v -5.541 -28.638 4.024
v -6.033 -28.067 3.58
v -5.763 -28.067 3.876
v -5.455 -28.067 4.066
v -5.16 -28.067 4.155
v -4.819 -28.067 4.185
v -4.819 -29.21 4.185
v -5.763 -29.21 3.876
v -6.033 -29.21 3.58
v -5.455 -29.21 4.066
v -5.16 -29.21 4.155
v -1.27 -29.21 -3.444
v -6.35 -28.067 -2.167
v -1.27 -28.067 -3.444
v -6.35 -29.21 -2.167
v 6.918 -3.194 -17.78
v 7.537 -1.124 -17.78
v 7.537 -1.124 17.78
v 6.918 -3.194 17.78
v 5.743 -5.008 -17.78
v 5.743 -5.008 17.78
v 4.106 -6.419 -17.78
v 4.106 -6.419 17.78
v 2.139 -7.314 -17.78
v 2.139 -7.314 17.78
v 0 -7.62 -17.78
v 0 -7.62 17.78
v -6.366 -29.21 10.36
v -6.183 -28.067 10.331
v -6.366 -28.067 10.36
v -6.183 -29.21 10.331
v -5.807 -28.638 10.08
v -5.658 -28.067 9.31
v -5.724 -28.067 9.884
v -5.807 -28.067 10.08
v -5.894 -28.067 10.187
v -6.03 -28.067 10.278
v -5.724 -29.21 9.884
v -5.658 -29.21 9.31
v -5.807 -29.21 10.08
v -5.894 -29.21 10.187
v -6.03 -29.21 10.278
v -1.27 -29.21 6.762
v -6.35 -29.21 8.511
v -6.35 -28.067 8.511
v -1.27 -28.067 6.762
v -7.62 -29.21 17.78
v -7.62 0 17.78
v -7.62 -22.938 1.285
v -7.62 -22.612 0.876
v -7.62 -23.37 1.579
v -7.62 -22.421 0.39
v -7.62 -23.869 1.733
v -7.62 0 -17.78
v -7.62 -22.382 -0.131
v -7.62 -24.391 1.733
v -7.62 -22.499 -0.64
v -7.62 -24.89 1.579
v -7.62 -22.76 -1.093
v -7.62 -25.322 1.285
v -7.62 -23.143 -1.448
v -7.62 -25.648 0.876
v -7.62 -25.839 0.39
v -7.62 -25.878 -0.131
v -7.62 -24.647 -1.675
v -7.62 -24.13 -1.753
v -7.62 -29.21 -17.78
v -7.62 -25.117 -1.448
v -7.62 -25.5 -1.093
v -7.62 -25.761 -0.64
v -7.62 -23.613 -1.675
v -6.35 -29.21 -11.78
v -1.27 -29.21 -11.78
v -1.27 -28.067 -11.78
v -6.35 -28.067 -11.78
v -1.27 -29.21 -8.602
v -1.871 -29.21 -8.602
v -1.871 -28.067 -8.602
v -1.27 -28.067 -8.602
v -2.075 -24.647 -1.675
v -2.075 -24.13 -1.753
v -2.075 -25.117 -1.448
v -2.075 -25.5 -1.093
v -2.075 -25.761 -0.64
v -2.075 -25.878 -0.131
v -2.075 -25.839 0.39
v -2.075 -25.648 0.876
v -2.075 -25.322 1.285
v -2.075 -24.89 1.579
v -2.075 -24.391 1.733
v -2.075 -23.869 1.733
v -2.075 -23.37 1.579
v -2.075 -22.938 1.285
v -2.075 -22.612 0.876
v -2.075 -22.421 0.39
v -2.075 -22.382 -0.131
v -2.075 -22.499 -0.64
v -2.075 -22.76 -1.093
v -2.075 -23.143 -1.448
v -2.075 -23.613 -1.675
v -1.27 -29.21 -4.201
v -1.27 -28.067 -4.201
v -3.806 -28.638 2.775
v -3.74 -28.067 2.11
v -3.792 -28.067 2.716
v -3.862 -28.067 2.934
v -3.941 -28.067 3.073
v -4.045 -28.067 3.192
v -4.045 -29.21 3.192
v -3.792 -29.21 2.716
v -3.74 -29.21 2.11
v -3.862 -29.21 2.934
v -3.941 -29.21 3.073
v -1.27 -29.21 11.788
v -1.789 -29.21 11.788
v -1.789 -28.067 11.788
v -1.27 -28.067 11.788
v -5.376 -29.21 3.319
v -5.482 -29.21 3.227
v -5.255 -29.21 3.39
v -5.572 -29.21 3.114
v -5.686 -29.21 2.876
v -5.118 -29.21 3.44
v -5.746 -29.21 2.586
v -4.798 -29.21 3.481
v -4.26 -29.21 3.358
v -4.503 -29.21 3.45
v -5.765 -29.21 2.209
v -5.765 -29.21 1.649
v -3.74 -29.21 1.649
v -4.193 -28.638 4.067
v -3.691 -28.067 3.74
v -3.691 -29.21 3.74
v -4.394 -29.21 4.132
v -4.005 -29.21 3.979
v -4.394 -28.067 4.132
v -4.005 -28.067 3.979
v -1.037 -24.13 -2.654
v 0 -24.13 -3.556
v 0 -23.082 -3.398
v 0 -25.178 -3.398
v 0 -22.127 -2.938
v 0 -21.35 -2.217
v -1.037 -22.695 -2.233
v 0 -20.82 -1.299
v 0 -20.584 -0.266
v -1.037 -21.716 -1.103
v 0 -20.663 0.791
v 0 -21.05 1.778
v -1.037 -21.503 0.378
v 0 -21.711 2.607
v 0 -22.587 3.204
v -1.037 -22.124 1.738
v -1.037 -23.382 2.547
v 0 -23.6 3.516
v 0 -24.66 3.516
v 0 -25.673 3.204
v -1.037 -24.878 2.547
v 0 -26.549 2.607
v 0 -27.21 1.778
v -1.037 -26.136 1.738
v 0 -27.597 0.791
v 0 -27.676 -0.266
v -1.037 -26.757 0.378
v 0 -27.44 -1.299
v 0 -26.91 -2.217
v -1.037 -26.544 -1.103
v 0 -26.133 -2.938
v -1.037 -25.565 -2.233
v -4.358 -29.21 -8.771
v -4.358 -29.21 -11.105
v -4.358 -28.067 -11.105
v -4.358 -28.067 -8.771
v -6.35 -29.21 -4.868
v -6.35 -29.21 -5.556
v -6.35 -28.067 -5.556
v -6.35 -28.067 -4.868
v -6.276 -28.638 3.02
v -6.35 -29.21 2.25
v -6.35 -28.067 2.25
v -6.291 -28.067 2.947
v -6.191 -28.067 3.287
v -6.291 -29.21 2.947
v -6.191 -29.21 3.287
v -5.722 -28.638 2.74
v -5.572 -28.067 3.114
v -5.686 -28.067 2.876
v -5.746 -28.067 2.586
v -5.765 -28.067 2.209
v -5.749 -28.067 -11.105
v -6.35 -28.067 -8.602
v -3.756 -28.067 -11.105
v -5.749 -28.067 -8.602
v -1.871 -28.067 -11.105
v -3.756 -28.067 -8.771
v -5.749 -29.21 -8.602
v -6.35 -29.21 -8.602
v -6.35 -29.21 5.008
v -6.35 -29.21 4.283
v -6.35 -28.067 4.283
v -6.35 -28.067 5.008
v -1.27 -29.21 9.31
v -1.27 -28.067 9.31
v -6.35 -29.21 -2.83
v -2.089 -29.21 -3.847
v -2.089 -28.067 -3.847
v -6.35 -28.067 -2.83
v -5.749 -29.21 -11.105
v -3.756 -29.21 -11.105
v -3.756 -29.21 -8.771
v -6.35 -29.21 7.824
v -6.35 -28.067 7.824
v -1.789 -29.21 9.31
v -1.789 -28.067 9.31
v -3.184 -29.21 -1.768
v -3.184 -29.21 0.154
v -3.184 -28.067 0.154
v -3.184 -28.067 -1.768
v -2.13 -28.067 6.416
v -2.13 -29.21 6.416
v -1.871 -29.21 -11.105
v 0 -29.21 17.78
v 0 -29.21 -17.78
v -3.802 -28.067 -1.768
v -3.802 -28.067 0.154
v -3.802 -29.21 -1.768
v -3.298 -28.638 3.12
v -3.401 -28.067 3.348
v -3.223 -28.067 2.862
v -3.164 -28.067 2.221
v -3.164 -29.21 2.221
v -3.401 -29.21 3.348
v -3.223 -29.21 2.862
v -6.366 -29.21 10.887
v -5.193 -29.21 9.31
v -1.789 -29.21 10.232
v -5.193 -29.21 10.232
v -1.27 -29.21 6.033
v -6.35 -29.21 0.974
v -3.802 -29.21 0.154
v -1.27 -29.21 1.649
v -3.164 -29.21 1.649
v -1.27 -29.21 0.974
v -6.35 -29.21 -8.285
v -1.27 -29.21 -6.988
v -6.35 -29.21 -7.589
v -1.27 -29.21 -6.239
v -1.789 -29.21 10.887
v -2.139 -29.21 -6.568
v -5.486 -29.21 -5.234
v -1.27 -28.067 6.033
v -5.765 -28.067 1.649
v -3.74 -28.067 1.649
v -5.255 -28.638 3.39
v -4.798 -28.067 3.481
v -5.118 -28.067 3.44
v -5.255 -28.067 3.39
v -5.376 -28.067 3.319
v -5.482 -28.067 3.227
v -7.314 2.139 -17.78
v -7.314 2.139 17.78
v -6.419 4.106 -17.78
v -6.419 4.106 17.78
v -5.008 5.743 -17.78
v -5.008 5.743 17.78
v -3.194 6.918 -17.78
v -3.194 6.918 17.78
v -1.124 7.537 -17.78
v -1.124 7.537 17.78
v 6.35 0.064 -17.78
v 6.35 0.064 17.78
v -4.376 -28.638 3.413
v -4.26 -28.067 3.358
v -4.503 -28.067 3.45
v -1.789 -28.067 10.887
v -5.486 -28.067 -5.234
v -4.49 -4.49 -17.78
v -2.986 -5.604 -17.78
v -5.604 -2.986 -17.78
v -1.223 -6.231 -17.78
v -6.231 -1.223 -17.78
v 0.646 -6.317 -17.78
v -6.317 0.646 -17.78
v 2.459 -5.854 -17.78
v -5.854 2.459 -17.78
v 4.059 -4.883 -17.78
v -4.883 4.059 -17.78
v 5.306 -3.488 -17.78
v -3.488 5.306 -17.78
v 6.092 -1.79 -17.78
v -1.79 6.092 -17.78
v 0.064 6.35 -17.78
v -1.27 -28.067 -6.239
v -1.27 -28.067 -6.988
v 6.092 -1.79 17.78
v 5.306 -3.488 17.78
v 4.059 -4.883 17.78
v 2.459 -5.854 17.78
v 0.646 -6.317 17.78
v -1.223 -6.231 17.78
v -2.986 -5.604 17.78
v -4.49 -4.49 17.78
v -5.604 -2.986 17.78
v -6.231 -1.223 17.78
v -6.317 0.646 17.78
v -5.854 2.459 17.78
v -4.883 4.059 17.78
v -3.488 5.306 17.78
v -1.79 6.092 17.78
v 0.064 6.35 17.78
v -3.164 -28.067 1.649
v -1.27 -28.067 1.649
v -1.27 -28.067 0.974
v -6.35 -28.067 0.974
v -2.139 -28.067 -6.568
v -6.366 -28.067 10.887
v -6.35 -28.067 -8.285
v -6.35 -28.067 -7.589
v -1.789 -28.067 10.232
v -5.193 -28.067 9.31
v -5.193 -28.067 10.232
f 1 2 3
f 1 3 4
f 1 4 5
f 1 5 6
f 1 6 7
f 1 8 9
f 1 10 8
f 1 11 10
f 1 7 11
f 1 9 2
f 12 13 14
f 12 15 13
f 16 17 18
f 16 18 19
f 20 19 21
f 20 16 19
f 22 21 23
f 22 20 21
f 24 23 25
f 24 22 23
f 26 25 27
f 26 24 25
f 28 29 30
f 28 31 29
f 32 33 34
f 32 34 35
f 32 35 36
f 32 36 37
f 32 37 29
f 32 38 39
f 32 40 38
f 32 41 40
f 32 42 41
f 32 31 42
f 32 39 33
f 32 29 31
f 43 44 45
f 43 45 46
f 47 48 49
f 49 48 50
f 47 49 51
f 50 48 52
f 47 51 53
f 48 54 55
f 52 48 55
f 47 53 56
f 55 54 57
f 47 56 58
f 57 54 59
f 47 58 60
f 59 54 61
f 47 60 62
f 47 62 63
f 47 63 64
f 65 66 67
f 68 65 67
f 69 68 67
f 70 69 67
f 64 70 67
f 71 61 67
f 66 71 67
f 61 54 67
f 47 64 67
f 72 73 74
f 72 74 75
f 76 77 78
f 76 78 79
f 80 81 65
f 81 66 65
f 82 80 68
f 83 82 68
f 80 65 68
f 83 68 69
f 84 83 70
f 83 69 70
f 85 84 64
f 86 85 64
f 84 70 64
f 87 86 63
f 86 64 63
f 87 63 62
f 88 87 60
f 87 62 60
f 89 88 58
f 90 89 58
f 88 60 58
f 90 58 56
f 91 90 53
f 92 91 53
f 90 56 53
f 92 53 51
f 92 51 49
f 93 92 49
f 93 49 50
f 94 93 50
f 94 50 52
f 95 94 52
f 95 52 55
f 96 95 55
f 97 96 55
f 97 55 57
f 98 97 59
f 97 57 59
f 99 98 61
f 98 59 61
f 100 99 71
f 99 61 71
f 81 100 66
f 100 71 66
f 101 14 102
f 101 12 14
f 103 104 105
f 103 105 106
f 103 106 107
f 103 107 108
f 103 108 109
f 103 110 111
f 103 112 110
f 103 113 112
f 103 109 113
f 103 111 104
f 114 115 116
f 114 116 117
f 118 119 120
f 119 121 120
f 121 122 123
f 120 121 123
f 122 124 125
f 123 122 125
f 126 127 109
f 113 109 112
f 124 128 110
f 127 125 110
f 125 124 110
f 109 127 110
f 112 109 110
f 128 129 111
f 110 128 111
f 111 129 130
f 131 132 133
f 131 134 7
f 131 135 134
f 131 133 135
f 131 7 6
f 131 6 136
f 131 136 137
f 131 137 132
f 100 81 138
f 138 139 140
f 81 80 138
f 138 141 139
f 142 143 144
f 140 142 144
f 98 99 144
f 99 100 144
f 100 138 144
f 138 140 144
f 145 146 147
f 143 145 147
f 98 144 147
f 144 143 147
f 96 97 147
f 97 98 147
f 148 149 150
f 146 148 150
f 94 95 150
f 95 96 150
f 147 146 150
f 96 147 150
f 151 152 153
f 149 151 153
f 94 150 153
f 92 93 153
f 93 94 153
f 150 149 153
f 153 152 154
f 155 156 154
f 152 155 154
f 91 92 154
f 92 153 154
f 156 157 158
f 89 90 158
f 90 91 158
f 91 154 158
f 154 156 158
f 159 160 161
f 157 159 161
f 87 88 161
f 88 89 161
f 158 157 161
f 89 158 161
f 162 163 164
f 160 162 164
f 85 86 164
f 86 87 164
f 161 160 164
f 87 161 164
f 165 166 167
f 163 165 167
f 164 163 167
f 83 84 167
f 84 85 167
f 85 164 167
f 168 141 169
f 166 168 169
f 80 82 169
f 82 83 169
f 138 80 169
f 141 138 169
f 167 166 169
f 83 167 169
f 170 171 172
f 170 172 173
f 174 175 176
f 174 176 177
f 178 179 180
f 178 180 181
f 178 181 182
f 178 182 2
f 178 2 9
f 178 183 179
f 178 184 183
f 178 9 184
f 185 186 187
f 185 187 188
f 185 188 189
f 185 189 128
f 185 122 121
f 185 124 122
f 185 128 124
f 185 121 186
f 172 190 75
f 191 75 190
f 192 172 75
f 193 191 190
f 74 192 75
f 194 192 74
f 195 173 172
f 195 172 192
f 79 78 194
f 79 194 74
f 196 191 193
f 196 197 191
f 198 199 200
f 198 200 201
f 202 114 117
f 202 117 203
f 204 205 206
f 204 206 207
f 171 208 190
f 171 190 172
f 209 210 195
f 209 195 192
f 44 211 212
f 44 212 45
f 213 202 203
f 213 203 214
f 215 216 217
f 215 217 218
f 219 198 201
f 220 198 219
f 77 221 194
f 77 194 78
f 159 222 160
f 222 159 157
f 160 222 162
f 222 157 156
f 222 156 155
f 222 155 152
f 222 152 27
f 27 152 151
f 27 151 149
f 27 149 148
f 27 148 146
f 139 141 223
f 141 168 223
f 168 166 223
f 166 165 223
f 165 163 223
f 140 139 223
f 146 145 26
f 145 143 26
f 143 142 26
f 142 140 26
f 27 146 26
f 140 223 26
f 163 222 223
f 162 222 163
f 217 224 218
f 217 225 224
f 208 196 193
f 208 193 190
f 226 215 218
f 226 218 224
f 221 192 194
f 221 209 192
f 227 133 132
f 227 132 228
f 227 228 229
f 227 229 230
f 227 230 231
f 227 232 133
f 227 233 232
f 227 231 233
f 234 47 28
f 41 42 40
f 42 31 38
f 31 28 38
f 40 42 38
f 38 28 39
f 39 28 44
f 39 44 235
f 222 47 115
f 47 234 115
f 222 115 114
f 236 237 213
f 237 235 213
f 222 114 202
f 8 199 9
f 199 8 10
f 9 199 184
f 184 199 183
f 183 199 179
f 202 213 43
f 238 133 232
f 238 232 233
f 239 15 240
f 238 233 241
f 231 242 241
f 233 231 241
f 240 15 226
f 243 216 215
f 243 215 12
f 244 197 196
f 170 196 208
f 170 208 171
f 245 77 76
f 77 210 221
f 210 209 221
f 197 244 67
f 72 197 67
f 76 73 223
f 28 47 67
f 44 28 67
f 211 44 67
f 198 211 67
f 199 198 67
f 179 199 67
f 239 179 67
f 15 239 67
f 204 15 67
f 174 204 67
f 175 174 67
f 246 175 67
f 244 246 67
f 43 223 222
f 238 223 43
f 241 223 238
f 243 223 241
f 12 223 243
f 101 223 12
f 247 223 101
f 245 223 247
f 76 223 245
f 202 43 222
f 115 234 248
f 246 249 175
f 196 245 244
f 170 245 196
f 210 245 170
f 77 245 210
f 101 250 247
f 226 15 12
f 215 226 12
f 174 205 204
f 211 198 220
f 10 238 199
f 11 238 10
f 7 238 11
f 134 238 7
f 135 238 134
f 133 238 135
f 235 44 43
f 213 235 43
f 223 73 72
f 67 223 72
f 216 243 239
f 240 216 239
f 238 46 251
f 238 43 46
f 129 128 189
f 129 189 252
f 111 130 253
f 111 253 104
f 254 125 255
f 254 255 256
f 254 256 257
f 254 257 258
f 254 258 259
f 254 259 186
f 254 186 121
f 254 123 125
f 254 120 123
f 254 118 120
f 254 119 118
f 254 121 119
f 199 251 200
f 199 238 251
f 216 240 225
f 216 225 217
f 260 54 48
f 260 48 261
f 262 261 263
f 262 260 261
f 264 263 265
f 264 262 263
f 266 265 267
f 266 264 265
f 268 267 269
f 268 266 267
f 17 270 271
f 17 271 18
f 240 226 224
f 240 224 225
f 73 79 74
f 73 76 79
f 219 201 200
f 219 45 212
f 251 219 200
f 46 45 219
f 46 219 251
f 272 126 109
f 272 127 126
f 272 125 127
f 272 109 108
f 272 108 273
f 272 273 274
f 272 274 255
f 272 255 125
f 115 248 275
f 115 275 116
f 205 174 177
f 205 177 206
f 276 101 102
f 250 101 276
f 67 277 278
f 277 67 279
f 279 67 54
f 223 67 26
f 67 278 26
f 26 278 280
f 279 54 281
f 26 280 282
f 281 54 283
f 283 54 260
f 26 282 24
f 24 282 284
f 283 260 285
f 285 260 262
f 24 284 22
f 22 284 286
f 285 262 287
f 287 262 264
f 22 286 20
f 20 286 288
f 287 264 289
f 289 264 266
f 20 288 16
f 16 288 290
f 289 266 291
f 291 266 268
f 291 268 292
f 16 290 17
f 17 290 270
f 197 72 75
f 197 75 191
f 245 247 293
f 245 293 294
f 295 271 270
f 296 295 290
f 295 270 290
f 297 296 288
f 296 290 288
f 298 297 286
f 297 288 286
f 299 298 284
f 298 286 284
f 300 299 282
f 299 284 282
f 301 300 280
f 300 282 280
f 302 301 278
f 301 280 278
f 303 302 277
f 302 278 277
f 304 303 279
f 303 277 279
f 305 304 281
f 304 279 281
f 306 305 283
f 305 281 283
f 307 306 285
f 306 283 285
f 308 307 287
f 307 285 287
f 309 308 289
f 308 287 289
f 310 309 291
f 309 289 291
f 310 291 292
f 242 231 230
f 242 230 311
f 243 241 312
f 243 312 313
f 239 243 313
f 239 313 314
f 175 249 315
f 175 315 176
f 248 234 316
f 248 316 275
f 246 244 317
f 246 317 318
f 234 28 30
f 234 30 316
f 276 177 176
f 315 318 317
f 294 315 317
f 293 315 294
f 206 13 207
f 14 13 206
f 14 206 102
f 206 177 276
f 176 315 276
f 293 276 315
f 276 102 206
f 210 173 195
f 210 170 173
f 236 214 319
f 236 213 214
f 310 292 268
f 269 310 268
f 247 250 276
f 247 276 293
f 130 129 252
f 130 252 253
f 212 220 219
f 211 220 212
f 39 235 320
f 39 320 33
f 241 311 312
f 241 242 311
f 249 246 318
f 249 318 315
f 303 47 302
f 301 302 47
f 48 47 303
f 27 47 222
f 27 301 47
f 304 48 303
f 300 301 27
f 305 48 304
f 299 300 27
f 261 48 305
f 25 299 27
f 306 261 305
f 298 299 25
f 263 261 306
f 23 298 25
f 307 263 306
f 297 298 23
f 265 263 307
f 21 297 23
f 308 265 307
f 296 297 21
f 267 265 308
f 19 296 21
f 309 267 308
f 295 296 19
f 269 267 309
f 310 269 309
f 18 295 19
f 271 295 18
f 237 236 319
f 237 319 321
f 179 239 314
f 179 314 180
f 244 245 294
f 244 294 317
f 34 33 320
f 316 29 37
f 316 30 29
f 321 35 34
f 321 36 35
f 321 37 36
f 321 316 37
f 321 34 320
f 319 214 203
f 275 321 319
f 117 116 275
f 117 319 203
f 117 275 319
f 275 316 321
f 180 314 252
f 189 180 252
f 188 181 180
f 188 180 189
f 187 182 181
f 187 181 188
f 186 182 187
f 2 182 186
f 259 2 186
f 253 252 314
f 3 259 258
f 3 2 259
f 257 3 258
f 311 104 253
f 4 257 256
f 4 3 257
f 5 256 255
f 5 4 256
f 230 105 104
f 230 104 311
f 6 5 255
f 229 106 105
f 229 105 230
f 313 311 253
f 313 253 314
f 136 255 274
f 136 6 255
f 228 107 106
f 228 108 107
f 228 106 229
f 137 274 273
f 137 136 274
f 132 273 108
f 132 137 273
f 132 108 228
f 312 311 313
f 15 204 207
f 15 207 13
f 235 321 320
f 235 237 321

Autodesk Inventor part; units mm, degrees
ref_plane "YZ Plane" through (0, 0, 0) normal (1, 0, 0) x (0, 1, 0)
ref_plane "XZ Plane" through (0, 0, 0) normal (0, 1, 0) x (-1, 0, 0)
ref_plane "XY Plane" through (0, 0, 0) normal (0, 0, 1) x (1, 0, 0)
sketch "Sketch4" plane through (0, 0, 0) normal (0, 0, 1) x (1, 0, 0)
  arc A0 (0.0635, 6.3497) -> (6.3497, 0.0635) centre (0, 0) ccw
  arc A1 (-1.1235, 7.5367) -> (7.5367, -1.1235) centre (0, 0) ccw
  line L0 (0, 0) -> (0, 7.9375) construction
  line L1 (0.0635, 6.3497) -> (6.3497, 0.0635) construction
  line L2 (0.0635, 6.3497) -> (-1.1235, 7.5367)
  line L3 (6.3497, 0.0635) -> (7.5367, -1.1235)
  circle A2 centre (0, 0) radius 6.35
  dimension "d10" = 12.7
  dimension "d11" = 1.27
  dimension "d12" = 45
  dimension "d13" = 8.89
extrude "Extrusion3" add sketch "Sketch4" along normal mid plane 35.56 contours A0 L3 A1 L2
sketch "Sketch5" plane through (0, 0, 0) normal (0, 0, 1) x (1, 0, 0)
  arc A0 (-1.1235, 7.5367) -> (7.5367, -1.1235) centre (0, 0) ccw projected
  line L0 (-7.62, 0) -> (-7.62, -29.21)
  line L1 (-7.62, -29.21) -> (0, -29.21)
  line L2 (0, -29.21) -> (0, -7.62)
  circle A1 centre (0, 0) radius 7.9375
  dimension "d16" = 21.59
extrude "Extrusion4" add sketch "Sketch5" along normal mid plane 35.56 contours A0 L2 A1 L0 | A1 L2 L1 L0 picked at (-7.3048, -2.4081)
sketch "Sketch6" plane through (0, -29.21, 17.78) normal (1, 0, 0) x (0, 0, -1)
  line L0 (0, 21.59) -> (35.56, 21.59) projected
  line L1 (35.56, 21.59) -> (35.56, 0) projected
  line L2 (0, 0) -> (35.56, 0) projected
  line L3 (0, 0) -> (0, 21.59) projected
  line L4 (17.78, 0) -> (17.78, 21.59) construction
  point P0 (17.78, 29.21)
  point P1 (17.78, 5.08)
  dimension "d30" = 5.08
  dimension "d31" = 0
hole "Hole1" at (0, -24.13, 0) direction (-1, 0, 0) diameter 3.5052 end through all countersink diameter 7.112 countersink angle 82
sketch "Sketch10" plane through (-7.62, -29.21, 17.78) normal (0, -1, 0) x (1, 0, 0)
  line L0 (0, -35.56) -> (0, 0) projected
  line L1 (7.62, -35.56) -> (0, -35.56) projected
  line L2 (7.62, 0) -> (7.62, -35.56) projected
  line L3 (0, 0) -> (7.62, 0) projected
  line L4 (3.81, -35.56) -> (3.81, 0) construction
  line L5 (6.35, -29.5599) -> (1.27, -29.5599)
  line L6 (1.27, -29.5599) -> (1.27, -26.3818)
  line L7 (1.27, -26.3818) -> (1.871, -26.3818)
  line L8 (1.871, -26.3818) -> (1.871, -28.8848)
  line L9 (1.871, -28.8848) -> (3.2625, -28.8848)
  line L10 (3.2625, -28.8848) -> (3.2625, -26.5506)
  line L11 (3.2625, -26.5506) -> (3.8635, -26.5506)
  line L12 (3.8635, -26.5506) -> (3.8635, -28.8848)
  line L13 (3.8635, -28.8848) -> (5.749, -28.8848)
  line L14 (5.749, -28.8848) -> (5.749, -26.3818)
  line L15 (5.749, -26.3818) -> (6.35, -26.3818)
  line L16 (6.35, -26.3818) -> (6.35, -29.5599)
  line L17 (1.27, -19.9474) -> (6.35, -21.2236)
  line L18 (6.35, -21.2236) -> (6.35, -21.9811)
  line L19 (6.35, -21.9811) -> (2.1345, -23.0144)
  line L20 (2.1345, -23.0144) -> (6.35, -24.0188)
  line L21 (6.35, -24.0188) -> (6.35, -24.7681)
  line L22 (6.35, -24.7681) -> (1.27, -26.0648)
  line L23 (1.27, -26.0648) -> (1.27, -25.3691)
  line L24 (1.27, -25.3691) -> (5.4814, -24.3482)
  line L25 (5.4814, -24.3482) -> (1.27, -23.3355)
  line L26 (1.27, -23.3355) -> (1.27, -22.648)
  line L27 (1.27, -22.648) -> (5.5308, -21.6271)
  line L28 (5.5308, -21.6271) -> (1.27, -20.6102)
  line L29 (1.27, -20.6102) -> (1.27, -19.9474)
  line L30 (4.4357, -17.6256) -> (4.4357, -19.5481)
  line L31 (4.4357, -19.5481) -> (3.8182, -19.5481)
  line L32 (3.8182, -19.5481) -> (3.8182, -17.6256)
  line L33 (3.8182, -17.6256) -> (4.4357, -17.6256)
  spline S0 degree 2 poles (2.8014, -13.5954) (3.1307, -13.5954) (3.7235, -13.83) (3.9294, -14.04) knots 0 0 0 1 2 2 2
  spline S1 degree 2 poles (3.9294, -14.04) (4.1887, -14.3035) (4.4563, -15.0156) (4.4563, -15.559) knots 0 0 0 1 2 2 2
  line L34 (4.4563, -15.559) -> (4.4563, -16.1313)
  line L35 (4.4563, -16.1313) -> (6.35, -16.1313)
  line L36 (6.35, -16.1313) -> (6.35, -16.8064)
  line L37 (6.35, -16.8064) -> (1.27, -16.8064)
  line L38 (1.27, -16.8064) -> (1.27, -15.5302)
  spline S2 degree 2 poles (1.27, -15.5302) (1.27, -15.0774) (1.4182, -14.4434) (1.587, -14.2005) knots 0 0 0 1 2 2 2
  spline S3 degree 2 poles (1.587, -14.2005) (1.7805, -13.9165) (2.3774, -13.5954) (2.8014, -13.5954) knots 0 0 0 1 2 2 2
  spline S4 degree 2 poles (2.822, -14.2993) (2.5585, -14.2993) (2.1716, -14.4805) (2.0481, -14.6657) knots 0 0 0 1 2 2 2
  spline S5 degree 2 poles (2.0481, -14.6657) (1.941, -14.8263) (1.8546, -15.2544) (1.8546, -15.5714) knots 0 0 0 1 2 2 2
  line L39 (1.8546, -15.5714) -> (1.8546, -16.1313)
  line L40 (1.8546, -16.1313) -> (3.88, -16.1313)
  line L41 (3.88, -16.1313) -> (3.88, -15.6702)
  spline S6 degree 2 poles (3.88, -15.6702) (3.88, -15.2585) (3.7482, -14.7522) (3.5753, -14.5875) knots 0 0 0 1 2 2 2
  spline S7 degree 2 poles (3.5753, -14.5875) (3.423, -14.4352) (3.0649, -14.2993) (2.822, -14.2993) knots 0 0 0 1 2 2 2
  line L42 (1.27, -9.2687) -> (6.35, -11.0183)
  line L43 (6.35, -11.0183) -> (6.35, -11.747)
  line L44 (6.35, -11.747) -> (1.27, -13.4966)
  line L45 (1.27, -13.4966) -> (1.27, -12.772)
  line L46 (1.27, -12.772) -> (5.4896, -11.3641)
  line L47 (5.4896, -11.3641) -> (1.27, -9.9562)
  line L48 (1.27, -9.9562) -> (1.27, -9.2687)
  line L49 (6.35, -5.9918) -> (6.35, -8.4701)
  line L50 (6.35, -8.4701) -> (5.8313, -8.4701)
  line L51 (5.8313, -8.4701) -> (5.8313, -7.548)
  line L52 (5.8313, -7.548) -> (2.4268, -7.548)
  line L53 (2.4268, -7.548) -> (2.4268, -8.4701)
  line L54 (2.4268, -8.4701) -> (1.9616, -8.4701)
  spline S8 degree 2 poles (1.9616, -8.4701) (1.9616, -7.9473) (1.6652, -7.4533) (1.2535, -7.4203) knots 0 0 0 1 2 2 2
  line L55 (1.2535, -7.4203) -> (1.2535, -6.8934)
  line L56 (1.2535, -6.8934) -> (5.8313, -6.8934)
  line L57 (5.8313, -6.8934) -> (5.8313, -5.9918)
  line L58 (5.8313, -5.9918) -> (6.35, -5.9918)
  point P0 (7.62, -17.78)
extrude "Text" cut sketch "Sketch10" against normal blind 1.143 contours L5 L6 L7 L8 L9 L10 L11 L12 L13 L14 L15 L16 | L17 L18 L19 L20 L21 L22 L23 L24 L25 L26 L27 L28 L29 | L30 L31 L32 L33 | S0 S1 L34 L35 L36 L37 L38 S2 S3 | L42 L43 L44 L45 L46 L47 L48 | L49 L50 L51 L52 L53 L54 S8 L55 L56 L57 L58
equation "\"d10\" = shadeDiameter"
equation "\"d11\" = shadeHolderWallThickness"
equation "\"d13\" = openingForShade"
equation "\"d14\" = partWidth"
equation "\"d16\" = flatBelowShade"
equation "\"d17\" = partWidth"
equation "\"d30\" = holeHeightAboveBottom"
equation "\"d28\" = textDepth"
equation "\"shadeDiameter\" = 12.7"
equation "\"partWidth\" = 35.56"
equation "\"backThickness\" = 1.905"
equation "\"backHeight\" = 25.4"
equation "\"cutTiltAngle\" = 45deg"
equation "\"flatBelowShade\" = 21.59"
equation "\"shadeHolderWallThickness\" = 1.27"
equation "\"openingForShade\" = 8.89"
equation "\"textDepth\" = 1.143"
equation "\"holeHeightAboveBottom\" = 5.08"
properties part number "shadeHolderEmergencyExitWindow"
